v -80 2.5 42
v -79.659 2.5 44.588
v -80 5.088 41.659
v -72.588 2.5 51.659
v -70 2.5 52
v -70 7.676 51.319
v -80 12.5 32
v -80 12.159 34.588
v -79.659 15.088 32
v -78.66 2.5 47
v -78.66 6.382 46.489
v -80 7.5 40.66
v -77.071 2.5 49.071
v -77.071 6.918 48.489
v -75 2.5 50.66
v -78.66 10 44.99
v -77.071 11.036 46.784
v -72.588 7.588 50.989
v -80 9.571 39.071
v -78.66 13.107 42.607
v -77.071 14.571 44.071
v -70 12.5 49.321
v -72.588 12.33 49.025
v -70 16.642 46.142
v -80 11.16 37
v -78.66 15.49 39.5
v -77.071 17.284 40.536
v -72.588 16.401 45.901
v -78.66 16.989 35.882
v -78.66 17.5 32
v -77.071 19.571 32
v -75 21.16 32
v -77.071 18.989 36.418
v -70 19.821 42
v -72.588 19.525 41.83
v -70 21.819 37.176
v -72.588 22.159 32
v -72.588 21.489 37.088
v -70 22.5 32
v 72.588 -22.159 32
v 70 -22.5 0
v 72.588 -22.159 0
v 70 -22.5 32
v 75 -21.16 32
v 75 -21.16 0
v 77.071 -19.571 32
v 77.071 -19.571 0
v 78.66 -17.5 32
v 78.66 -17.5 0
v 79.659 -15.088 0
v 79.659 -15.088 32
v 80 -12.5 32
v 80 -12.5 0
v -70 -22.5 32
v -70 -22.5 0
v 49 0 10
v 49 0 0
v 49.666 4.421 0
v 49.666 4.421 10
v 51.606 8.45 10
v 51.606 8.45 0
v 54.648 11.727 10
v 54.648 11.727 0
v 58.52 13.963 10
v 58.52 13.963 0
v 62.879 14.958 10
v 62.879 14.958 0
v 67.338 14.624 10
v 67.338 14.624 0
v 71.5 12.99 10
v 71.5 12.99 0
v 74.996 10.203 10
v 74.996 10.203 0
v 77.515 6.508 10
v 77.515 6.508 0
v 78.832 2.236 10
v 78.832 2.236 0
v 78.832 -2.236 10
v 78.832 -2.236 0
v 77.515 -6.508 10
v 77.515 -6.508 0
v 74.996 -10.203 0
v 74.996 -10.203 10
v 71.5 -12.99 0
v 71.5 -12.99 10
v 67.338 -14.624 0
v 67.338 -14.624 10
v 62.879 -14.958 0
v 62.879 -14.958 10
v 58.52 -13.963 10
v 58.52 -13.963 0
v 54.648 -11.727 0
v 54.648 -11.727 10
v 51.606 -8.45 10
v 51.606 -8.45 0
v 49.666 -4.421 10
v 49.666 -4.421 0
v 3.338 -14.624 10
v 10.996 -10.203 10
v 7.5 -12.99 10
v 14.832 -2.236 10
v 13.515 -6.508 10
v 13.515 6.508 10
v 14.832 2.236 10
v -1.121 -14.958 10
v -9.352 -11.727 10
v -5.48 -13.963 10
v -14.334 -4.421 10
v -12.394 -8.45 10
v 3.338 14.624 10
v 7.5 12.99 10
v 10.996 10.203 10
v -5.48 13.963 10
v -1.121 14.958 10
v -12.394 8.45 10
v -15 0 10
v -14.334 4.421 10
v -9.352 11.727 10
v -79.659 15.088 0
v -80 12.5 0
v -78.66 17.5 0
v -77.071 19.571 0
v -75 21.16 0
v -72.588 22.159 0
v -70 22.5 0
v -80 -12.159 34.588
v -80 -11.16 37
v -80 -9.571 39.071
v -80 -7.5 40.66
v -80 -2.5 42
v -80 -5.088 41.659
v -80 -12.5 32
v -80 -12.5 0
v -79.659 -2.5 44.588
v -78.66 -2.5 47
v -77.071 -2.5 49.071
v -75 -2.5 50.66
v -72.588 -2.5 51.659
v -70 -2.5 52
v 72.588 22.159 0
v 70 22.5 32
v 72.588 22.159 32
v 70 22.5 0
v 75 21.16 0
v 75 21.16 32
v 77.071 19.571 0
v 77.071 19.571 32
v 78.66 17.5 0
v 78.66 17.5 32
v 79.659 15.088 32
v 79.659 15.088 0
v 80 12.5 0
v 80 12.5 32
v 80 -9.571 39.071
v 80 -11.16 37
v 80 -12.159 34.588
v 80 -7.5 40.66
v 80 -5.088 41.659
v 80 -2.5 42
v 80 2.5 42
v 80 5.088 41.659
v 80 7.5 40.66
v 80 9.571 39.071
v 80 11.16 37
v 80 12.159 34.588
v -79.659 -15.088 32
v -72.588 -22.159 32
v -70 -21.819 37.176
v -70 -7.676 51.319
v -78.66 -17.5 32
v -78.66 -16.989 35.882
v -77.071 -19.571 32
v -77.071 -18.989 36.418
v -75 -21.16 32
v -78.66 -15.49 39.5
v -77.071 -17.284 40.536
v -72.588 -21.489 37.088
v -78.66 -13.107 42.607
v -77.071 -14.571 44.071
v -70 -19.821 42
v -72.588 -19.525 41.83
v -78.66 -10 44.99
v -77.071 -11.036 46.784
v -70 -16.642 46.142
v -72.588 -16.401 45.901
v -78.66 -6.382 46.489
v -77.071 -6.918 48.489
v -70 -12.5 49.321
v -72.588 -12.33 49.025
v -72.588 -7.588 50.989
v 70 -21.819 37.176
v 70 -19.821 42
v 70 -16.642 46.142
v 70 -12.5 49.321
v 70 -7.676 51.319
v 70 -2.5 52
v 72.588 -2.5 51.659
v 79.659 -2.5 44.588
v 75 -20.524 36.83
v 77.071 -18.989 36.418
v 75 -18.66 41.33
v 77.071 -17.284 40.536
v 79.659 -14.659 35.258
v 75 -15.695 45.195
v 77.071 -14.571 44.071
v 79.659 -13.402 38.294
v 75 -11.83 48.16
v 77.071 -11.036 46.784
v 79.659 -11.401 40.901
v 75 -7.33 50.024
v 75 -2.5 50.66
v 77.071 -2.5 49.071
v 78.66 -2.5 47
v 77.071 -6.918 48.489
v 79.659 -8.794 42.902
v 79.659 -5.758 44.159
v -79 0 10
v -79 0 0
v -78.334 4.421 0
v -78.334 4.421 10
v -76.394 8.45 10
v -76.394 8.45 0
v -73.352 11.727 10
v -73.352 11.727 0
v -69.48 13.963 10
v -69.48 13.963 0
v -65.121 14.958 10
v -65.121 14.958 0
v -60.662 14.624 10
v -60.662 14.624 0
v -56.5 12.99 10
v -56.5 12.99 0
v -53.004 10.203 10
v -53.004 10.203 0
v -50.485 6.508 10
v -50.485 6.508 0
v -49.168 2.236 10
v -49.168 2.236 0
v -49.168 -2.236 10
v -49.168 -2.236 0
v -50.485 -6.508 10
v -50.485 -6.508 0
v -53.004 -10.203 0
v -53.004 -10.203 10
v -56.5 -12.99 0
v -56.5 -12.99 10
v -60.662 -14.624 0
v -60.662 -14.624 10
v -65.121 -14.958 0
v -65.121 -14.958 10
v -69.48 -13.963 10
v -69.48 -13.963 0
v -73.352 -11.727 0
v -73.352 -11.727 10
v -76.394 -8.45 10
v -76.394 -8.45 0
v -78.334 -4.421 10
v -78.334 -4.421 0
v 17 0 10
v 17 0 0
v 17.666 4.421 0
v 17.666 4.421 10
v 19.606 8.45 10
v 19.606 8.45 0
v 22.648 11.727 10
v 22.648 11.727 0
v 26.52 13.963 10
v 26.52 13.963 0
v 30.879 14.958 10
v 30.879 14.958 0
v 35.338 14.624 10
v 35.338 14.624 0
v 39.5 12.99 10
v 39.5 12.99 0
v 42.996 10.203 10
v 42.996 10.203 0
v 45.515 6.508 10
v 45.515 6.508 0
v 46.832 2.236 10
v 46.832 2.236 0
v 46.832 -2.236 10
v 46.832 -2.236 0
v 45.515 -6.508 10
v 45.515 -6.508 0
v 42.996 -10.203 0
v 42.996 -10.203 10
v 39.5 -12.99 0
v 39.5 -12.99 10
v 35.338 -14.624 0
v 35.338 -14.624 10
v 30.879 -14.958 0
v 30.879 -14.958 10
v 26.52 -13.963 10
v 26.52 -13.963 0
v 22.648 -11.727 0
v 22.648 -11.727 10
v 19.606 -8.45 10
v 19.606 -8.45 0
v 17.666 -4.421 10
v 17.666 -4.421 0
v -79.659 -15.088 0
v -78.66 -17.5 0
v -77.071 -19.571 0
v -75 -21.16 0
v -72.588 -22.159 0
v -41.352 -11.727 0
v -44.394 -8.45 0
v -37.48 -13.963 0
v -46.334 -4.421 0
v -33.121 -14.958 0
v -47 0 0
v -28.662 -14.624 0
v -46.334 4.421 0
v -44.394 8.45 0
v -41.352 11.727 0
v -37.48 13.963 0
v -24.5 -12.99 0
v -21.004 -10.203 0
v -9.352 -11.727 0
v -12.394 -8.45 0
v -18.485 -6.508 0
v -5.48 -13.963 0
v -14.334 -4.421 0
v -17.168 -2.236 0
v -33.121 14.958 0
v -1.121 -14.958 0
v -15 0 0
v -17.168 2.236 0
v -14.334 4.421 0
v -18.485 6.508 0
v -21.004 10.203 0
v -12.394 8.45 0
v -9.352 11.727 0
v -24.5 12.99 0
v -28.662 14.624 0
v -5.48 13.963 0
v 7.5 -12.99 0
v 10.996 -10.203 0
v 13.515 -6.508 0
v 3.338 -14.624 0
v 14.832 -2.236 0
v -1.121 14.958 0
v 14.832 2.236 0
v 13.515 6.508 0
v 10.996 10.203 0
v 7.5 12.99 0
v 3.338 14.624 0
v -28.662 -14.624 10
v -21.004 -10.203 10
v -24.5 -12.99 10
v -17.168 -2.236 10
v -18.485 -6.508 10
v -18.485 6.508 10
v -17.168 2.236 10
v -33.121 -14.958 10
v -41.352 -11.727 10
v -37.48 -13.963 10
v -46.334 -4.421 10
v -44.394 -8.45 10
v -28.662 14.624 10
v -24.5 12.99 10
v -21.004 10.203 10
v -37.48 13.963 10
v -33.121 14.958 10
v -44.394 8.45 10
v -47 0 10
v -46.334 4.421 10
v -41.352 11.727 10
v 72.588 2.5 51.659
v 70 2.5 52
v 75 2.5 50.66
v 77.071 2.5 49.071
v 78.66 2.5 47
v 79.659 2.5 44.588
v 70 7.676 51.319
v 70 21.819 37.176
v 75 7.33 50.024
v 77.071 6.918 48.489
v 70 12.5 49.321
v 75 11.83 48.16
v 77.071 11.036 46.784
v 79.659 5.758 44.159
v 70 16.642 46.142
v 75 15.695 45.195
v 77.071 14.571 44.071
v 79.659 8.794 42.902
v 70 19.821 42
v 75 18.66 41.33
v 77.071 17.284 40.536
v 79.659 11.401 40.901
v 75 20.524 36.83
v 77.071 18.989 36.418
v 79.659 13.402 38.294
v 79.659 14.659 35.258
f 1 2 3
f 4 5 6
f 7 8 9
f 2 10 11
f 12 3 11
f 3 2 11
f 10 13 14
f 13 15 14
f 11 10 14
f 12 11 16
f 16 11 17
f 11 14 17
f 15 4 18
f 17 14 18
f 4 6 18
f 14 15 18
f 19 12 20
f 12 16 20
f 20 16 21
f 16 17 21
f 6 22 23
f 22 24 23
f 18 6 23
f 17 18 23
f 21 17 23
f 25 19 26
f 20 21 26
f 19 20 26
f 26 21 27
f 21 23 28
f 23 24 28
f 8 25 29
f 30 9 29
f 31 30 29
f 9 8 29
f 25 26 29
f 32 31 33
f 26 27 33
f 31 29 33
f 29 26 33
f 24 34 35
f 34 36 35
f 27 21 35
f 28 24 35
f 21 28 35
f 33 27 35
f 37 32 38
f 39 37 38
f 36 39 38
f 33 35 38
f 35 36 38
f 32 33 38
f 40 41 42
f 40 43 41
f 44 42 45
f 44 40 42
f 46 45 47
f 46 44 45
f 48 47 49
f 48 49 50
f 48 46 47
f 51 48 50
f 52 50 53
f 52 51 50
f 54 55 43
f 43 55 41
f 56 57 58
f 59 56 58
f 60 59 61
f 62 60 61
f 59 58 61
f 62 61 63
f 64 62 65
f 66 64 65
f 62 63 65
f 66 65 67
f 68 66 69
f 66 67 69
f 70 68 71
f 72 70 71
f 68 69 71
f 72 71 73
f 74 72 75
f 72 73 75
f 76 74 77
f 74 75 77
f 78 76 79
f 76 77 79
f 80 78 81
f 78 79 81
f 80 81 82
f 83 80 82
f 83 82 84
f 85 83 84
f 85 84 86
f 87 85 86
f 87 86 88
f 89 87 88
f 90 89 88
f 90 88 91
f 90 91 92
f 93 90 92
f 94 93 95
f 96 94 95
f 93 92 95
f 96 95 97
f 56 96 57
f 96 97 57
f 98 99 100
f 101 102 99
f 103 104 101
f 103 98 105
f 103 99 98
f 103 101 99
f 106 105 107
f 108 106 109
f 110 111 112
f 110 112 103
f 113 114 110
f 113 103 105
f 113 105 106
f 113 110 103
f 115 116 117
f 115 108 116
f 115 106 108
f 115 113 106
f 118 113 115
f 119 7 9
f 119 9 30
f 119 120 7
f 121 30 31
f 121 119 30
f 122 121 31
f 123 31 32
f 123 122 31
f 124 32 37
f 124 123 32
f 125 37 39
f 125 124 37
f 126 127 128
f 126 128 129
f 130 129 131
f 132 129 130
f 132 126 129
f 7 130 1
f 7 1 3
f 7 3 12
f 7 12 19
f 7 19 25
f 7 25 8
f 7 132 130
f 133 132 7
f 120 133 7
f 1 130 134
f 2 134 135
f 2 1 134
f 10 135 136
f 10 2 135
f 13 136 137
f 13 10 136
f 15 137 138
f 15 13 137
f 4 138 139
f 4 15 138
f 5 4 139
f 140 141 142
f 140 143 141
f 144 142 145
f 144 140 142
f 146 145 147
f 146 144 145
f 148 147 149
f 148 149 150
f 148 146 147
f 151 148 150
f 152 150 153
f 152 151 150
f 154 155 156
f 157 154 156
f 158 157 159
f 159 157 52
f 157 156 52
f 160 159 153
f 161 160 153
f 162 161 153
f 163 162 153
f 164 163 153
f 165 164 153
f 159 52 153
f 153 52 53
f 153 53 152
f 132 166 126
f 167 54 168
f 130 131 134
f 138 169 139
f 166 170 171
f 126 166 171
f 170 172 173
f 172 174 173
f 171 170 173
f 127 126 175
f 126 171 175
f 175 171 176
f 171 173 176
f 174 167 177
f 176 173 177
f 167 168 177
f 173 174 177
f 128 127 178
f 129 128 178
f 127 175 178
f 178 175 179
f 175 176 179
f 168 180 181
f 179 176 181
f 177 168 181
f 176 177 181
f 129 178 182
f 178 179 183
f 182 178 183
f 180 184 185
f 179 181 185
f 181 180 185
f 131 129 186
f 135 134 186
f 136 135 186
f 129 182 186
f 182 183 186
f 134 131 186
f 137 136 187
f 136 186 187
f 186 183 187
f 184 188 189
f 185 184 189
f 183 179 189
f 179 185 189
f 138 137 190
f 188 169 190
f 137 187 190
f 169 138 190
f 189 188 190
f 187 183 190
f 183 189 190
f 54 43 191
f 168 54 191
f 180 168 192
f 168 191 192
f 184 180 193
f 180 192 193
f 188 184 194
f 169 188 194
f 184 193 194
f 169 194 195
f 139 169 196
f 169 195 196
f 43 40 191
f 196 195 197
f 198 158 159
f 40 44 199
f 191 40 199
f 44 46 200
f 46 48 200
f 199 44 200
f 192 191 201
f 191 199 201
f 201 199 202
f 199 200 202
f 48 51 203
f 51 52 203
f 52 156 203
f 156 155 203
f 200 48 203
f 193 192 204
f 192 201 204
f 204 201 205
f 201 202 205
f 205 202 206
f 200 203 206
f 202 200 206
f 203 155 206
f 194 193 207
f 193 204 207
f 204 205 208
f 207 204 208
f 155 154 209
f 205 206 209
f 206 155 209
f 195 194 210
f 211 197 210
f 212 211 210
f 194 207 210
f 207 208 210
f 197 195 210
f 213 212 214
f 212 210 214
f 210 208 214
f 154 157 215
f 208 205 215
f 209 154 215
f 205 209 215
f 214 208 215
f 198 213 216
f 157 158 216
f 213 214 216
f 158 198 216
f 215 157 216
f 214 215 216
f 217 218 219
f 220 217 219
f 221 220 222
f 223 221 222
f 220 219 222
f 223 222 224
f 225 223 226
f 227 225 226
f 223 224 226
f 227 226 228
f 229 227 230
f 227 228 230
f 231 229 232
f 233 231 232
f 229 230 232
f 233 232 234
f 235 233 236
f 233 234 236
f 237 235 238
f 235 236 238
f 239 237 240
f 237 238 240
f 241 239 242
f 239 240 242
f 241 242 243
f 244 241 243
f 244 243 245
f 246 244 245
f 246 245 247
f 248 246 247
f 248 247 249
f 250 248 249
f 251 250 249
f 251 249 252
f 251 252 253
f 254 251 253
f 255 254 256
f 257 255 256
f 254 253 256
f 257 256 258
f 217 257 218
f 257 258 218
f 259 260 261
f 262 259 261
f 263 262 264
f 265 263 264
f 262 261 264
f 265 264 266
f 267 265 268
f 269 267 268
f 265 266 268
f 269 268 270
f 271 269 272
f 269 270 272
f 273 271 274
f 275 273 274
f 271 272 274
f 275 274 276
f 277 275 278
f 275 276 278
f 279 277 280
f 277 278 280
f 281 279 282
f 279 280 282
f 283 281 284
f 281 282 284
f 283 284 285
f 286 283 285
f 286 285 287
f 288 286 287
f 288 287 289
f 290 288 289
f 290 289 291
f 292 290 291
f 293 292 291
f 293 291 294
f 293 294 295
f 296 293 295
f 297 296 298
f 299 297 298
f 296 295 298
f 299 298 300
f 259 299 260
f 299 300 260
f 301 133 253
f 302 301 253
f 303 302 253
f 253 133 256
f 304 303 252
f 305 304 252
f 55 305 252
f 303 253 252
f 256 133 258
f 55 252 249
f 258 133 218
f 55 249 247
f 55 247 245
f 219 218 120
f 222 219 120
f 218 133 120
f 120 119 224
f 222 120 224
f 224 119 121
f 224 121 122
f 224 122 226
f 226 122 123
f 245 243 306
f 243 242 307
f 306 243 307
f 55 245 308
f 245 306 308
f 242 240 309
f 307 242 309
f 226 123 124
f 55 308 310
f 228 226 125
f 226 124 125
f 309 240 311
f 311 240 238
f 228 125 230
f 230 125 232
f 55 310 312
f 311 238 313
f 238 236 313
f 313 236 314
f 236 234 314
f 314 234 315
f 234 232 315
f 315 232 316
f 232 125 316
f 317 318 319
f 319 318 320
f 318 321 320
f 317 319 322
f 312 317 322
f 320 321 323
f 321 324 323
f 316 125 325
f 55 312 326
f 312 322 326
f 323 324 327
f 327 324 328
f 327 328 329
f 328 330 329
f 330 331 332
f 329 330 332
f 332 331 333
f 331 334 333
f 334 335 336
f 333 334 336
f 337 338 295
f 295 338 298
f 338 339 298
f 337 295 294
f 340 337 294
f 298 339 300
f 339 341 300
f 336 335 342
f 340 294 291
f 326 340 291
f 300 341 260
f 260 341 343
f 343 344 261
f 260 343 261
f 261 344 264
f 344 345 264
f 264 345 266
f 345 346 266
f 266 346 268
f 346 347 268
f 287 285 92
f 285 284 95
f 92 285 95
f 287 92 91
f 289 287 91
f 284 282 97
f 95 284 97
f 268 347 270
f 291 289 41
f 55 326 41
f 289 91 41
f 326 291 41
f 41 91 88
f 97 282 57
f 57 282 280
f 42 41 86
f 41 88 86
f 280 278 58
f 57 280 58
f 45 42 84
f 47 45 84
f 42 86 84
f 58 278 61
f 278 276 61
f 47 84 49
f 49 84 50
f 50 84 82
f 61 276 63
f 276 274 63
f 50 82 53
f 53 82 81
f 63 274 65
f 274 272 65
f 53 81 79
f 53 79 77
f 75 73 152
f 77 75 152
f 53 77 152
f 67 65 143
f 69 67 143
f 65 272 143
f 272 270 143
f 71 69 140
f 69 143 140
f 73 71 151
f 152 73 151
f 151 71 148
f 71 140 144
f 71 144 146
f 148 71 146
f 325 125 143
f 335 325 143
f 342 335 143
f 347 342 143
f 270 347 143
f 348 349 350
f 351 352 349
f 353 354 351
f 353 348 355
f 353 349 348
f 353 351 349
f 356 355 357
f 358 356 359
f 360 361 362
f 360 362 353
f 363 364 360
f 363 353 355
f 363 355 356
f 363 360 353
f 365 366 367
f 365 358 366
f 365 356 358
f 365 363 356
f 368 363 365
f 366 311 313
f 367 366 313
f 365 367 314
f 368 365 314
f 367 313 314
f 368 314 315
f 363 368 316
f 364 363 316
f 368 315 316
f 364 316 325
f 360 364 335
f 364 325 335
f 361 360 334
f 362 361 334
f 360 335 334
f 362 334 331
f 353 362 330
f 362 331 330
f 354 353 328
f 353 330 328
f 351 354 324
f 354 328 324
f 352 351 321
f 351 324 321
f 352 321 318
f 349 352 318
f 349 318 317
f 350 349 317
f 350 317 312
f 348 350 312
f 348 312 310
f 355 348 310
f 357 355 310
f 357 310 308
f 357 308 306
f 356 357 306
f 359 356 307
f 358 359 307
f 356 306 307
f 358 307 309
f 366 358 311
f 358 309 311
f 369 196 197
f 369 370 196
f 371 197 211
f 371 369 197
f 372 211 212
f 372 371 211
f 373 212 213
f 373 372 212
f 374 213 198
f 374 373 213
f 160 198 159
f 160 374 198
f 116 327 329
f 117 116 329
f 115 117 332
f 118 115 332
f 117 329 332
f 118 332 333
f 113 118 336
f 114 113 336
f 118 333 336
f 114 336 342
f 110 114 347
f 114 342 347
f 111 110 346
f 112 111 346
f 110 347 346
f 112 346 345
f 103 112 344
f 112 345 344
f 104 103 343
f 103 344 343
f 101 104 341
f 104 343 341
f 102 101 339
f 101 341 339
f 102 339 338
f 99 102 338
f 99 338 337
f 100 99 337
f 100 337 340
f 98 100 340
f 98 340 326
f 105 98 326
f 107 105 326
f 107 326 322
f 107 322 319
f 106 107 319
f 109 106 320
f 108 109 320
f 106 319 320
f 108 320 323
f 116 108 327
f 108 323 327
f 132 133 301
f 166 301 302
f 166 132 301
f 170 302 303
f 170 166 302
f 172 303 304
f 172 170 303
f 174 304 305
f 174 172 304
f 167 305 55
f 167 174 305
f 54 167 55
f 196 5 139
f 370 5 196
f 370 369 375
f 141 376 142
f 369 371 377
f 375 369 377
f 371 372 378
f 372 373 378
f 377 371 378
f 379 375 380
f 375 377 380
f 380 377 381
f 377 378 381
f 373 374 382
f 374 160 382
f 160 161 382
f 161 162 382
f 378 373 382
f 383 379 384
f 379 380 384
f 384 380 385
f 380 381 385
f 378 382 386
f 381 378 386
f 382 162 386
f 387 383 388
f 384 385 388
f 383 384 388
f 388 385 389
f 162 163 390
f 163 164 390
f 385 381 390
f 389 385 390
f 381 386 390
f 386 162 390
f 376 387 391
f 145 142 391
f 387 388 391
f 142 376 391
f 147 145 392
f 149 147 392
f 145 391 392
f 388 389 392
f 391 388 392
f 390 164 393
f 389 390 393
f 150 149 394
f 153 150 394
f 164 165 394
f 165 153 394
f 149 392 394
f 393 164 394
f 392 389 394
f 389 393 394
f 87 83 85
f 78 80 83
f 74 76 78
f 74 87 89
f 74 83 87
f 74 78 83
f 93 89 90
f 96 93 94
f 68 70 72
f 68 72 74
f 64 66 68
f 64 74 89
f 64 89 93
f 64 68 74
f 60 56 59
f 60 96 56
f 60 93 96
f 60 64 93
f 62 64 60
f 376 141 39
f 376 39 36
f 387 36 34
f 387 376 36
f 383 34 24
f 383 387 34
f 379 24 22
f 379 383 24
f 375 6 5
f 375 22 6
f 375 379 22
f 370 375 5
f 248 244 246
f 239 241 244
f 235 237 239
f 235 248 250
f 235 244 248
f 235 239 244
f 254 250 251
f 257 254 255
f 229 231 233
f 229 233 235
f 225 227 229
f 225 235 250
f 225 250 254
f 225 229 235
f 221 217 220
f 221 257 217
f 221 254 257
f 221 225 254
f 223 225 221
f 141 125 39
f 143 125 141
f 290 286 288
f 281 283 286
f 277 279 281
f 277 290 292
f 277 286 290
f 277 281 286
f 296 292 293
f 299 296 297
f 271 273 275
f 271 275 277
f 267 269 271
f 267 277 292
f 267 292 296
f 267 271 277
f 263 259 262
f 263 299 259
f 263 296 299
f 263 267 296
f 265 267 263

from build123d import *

# Parameters (mm, degrees)
SKETCH_1_W             = 160
SKETCH_1_H             = 45
EXTRUDE_1_DEPTH        = 52
SKETCH_2_R             = 15
CUT_EXTRUDE_1_DEPTH    = 10
PATTERN_LINEAR_2_COUNT = 3
PATTERN_LINEAR_2_PITCH = 32
PATTERN_LINEAR_3_COUNT = 3
PATTERN_LINEAR_3_PITCH = 32
FILLET_1_R             = 20
FILLET_2_R             = 10


with BuildPart() as part:
    # 스케치1 → 보스-돌출1 (new body)
    with BuildSketch(Plane.XY):
        Rectangle(SKETCH_1_W, SKETCH_1_H)
    extrude(amount=EXTRUDE_1_DEPTH)

    # 스케치2 → 컷-돌출1 (cut)
    with BuildSketch(Plane(origin=(0, 0, 0), x_dir=(-1, 0, 0), z_dir=(0, 0, -1))):
        Circle(SKETCH_2_R)
    cut_extrude_1 = extrude(amount=-CUT_EXTRUDE_1_DEPTH, mode=Mode.SUBTRACT)

    # 선형 패턴2: 컷-돌출1 ×3
    with Locations(*[(-i * PATTERN_LINEAR_2_PITCH, 0, 0) for i in range(1, PATTERN_LINEAR_2_COUNT)]):
        add(cut_extrude_1, mode=Mode.SUBTRACT)

    # 선형 패턴3: 컷-돌출1 ×3
    with Locations(*[(i * PATTERN_LINEAR_3_PITCH, 0, 0) for i in range(1, PATTERN_LINEAR_3_COUNT)]):
        add(cut_extrude_1, mode=Mode.SUBTRACT)

    # 필렛1
    fillet_1_edges = [part.edges().sort_by_distance(p)[0] for p in [
        (0, -22.5, 52),
        (0, 22.5, 52),
    ]]
    fillet(fillet_1_edges, radius=FILLET_1_R)

    # 필렛2
    fillet_2_edges = [part.edges().sort_by_distance(p)[0] for p in [
        (80, 0, 52),
        (-80, 0, 52),
        (80, 22.5, 16),
        (80, -22.5, 16),
        (80, 16.642135624, 46.142135624),
        (80, -16.642135624, 46.142135624),
        (-80, -22.5, 16),
        (-80, 22.5, 16),
        (-80, 16.642135624, 46.142135624),
        (-80, -16.642135624, 46.142135624),
    ]]
    fillet(fillet_2_edges, radius=FILLET_2_R)


solid = part.part
